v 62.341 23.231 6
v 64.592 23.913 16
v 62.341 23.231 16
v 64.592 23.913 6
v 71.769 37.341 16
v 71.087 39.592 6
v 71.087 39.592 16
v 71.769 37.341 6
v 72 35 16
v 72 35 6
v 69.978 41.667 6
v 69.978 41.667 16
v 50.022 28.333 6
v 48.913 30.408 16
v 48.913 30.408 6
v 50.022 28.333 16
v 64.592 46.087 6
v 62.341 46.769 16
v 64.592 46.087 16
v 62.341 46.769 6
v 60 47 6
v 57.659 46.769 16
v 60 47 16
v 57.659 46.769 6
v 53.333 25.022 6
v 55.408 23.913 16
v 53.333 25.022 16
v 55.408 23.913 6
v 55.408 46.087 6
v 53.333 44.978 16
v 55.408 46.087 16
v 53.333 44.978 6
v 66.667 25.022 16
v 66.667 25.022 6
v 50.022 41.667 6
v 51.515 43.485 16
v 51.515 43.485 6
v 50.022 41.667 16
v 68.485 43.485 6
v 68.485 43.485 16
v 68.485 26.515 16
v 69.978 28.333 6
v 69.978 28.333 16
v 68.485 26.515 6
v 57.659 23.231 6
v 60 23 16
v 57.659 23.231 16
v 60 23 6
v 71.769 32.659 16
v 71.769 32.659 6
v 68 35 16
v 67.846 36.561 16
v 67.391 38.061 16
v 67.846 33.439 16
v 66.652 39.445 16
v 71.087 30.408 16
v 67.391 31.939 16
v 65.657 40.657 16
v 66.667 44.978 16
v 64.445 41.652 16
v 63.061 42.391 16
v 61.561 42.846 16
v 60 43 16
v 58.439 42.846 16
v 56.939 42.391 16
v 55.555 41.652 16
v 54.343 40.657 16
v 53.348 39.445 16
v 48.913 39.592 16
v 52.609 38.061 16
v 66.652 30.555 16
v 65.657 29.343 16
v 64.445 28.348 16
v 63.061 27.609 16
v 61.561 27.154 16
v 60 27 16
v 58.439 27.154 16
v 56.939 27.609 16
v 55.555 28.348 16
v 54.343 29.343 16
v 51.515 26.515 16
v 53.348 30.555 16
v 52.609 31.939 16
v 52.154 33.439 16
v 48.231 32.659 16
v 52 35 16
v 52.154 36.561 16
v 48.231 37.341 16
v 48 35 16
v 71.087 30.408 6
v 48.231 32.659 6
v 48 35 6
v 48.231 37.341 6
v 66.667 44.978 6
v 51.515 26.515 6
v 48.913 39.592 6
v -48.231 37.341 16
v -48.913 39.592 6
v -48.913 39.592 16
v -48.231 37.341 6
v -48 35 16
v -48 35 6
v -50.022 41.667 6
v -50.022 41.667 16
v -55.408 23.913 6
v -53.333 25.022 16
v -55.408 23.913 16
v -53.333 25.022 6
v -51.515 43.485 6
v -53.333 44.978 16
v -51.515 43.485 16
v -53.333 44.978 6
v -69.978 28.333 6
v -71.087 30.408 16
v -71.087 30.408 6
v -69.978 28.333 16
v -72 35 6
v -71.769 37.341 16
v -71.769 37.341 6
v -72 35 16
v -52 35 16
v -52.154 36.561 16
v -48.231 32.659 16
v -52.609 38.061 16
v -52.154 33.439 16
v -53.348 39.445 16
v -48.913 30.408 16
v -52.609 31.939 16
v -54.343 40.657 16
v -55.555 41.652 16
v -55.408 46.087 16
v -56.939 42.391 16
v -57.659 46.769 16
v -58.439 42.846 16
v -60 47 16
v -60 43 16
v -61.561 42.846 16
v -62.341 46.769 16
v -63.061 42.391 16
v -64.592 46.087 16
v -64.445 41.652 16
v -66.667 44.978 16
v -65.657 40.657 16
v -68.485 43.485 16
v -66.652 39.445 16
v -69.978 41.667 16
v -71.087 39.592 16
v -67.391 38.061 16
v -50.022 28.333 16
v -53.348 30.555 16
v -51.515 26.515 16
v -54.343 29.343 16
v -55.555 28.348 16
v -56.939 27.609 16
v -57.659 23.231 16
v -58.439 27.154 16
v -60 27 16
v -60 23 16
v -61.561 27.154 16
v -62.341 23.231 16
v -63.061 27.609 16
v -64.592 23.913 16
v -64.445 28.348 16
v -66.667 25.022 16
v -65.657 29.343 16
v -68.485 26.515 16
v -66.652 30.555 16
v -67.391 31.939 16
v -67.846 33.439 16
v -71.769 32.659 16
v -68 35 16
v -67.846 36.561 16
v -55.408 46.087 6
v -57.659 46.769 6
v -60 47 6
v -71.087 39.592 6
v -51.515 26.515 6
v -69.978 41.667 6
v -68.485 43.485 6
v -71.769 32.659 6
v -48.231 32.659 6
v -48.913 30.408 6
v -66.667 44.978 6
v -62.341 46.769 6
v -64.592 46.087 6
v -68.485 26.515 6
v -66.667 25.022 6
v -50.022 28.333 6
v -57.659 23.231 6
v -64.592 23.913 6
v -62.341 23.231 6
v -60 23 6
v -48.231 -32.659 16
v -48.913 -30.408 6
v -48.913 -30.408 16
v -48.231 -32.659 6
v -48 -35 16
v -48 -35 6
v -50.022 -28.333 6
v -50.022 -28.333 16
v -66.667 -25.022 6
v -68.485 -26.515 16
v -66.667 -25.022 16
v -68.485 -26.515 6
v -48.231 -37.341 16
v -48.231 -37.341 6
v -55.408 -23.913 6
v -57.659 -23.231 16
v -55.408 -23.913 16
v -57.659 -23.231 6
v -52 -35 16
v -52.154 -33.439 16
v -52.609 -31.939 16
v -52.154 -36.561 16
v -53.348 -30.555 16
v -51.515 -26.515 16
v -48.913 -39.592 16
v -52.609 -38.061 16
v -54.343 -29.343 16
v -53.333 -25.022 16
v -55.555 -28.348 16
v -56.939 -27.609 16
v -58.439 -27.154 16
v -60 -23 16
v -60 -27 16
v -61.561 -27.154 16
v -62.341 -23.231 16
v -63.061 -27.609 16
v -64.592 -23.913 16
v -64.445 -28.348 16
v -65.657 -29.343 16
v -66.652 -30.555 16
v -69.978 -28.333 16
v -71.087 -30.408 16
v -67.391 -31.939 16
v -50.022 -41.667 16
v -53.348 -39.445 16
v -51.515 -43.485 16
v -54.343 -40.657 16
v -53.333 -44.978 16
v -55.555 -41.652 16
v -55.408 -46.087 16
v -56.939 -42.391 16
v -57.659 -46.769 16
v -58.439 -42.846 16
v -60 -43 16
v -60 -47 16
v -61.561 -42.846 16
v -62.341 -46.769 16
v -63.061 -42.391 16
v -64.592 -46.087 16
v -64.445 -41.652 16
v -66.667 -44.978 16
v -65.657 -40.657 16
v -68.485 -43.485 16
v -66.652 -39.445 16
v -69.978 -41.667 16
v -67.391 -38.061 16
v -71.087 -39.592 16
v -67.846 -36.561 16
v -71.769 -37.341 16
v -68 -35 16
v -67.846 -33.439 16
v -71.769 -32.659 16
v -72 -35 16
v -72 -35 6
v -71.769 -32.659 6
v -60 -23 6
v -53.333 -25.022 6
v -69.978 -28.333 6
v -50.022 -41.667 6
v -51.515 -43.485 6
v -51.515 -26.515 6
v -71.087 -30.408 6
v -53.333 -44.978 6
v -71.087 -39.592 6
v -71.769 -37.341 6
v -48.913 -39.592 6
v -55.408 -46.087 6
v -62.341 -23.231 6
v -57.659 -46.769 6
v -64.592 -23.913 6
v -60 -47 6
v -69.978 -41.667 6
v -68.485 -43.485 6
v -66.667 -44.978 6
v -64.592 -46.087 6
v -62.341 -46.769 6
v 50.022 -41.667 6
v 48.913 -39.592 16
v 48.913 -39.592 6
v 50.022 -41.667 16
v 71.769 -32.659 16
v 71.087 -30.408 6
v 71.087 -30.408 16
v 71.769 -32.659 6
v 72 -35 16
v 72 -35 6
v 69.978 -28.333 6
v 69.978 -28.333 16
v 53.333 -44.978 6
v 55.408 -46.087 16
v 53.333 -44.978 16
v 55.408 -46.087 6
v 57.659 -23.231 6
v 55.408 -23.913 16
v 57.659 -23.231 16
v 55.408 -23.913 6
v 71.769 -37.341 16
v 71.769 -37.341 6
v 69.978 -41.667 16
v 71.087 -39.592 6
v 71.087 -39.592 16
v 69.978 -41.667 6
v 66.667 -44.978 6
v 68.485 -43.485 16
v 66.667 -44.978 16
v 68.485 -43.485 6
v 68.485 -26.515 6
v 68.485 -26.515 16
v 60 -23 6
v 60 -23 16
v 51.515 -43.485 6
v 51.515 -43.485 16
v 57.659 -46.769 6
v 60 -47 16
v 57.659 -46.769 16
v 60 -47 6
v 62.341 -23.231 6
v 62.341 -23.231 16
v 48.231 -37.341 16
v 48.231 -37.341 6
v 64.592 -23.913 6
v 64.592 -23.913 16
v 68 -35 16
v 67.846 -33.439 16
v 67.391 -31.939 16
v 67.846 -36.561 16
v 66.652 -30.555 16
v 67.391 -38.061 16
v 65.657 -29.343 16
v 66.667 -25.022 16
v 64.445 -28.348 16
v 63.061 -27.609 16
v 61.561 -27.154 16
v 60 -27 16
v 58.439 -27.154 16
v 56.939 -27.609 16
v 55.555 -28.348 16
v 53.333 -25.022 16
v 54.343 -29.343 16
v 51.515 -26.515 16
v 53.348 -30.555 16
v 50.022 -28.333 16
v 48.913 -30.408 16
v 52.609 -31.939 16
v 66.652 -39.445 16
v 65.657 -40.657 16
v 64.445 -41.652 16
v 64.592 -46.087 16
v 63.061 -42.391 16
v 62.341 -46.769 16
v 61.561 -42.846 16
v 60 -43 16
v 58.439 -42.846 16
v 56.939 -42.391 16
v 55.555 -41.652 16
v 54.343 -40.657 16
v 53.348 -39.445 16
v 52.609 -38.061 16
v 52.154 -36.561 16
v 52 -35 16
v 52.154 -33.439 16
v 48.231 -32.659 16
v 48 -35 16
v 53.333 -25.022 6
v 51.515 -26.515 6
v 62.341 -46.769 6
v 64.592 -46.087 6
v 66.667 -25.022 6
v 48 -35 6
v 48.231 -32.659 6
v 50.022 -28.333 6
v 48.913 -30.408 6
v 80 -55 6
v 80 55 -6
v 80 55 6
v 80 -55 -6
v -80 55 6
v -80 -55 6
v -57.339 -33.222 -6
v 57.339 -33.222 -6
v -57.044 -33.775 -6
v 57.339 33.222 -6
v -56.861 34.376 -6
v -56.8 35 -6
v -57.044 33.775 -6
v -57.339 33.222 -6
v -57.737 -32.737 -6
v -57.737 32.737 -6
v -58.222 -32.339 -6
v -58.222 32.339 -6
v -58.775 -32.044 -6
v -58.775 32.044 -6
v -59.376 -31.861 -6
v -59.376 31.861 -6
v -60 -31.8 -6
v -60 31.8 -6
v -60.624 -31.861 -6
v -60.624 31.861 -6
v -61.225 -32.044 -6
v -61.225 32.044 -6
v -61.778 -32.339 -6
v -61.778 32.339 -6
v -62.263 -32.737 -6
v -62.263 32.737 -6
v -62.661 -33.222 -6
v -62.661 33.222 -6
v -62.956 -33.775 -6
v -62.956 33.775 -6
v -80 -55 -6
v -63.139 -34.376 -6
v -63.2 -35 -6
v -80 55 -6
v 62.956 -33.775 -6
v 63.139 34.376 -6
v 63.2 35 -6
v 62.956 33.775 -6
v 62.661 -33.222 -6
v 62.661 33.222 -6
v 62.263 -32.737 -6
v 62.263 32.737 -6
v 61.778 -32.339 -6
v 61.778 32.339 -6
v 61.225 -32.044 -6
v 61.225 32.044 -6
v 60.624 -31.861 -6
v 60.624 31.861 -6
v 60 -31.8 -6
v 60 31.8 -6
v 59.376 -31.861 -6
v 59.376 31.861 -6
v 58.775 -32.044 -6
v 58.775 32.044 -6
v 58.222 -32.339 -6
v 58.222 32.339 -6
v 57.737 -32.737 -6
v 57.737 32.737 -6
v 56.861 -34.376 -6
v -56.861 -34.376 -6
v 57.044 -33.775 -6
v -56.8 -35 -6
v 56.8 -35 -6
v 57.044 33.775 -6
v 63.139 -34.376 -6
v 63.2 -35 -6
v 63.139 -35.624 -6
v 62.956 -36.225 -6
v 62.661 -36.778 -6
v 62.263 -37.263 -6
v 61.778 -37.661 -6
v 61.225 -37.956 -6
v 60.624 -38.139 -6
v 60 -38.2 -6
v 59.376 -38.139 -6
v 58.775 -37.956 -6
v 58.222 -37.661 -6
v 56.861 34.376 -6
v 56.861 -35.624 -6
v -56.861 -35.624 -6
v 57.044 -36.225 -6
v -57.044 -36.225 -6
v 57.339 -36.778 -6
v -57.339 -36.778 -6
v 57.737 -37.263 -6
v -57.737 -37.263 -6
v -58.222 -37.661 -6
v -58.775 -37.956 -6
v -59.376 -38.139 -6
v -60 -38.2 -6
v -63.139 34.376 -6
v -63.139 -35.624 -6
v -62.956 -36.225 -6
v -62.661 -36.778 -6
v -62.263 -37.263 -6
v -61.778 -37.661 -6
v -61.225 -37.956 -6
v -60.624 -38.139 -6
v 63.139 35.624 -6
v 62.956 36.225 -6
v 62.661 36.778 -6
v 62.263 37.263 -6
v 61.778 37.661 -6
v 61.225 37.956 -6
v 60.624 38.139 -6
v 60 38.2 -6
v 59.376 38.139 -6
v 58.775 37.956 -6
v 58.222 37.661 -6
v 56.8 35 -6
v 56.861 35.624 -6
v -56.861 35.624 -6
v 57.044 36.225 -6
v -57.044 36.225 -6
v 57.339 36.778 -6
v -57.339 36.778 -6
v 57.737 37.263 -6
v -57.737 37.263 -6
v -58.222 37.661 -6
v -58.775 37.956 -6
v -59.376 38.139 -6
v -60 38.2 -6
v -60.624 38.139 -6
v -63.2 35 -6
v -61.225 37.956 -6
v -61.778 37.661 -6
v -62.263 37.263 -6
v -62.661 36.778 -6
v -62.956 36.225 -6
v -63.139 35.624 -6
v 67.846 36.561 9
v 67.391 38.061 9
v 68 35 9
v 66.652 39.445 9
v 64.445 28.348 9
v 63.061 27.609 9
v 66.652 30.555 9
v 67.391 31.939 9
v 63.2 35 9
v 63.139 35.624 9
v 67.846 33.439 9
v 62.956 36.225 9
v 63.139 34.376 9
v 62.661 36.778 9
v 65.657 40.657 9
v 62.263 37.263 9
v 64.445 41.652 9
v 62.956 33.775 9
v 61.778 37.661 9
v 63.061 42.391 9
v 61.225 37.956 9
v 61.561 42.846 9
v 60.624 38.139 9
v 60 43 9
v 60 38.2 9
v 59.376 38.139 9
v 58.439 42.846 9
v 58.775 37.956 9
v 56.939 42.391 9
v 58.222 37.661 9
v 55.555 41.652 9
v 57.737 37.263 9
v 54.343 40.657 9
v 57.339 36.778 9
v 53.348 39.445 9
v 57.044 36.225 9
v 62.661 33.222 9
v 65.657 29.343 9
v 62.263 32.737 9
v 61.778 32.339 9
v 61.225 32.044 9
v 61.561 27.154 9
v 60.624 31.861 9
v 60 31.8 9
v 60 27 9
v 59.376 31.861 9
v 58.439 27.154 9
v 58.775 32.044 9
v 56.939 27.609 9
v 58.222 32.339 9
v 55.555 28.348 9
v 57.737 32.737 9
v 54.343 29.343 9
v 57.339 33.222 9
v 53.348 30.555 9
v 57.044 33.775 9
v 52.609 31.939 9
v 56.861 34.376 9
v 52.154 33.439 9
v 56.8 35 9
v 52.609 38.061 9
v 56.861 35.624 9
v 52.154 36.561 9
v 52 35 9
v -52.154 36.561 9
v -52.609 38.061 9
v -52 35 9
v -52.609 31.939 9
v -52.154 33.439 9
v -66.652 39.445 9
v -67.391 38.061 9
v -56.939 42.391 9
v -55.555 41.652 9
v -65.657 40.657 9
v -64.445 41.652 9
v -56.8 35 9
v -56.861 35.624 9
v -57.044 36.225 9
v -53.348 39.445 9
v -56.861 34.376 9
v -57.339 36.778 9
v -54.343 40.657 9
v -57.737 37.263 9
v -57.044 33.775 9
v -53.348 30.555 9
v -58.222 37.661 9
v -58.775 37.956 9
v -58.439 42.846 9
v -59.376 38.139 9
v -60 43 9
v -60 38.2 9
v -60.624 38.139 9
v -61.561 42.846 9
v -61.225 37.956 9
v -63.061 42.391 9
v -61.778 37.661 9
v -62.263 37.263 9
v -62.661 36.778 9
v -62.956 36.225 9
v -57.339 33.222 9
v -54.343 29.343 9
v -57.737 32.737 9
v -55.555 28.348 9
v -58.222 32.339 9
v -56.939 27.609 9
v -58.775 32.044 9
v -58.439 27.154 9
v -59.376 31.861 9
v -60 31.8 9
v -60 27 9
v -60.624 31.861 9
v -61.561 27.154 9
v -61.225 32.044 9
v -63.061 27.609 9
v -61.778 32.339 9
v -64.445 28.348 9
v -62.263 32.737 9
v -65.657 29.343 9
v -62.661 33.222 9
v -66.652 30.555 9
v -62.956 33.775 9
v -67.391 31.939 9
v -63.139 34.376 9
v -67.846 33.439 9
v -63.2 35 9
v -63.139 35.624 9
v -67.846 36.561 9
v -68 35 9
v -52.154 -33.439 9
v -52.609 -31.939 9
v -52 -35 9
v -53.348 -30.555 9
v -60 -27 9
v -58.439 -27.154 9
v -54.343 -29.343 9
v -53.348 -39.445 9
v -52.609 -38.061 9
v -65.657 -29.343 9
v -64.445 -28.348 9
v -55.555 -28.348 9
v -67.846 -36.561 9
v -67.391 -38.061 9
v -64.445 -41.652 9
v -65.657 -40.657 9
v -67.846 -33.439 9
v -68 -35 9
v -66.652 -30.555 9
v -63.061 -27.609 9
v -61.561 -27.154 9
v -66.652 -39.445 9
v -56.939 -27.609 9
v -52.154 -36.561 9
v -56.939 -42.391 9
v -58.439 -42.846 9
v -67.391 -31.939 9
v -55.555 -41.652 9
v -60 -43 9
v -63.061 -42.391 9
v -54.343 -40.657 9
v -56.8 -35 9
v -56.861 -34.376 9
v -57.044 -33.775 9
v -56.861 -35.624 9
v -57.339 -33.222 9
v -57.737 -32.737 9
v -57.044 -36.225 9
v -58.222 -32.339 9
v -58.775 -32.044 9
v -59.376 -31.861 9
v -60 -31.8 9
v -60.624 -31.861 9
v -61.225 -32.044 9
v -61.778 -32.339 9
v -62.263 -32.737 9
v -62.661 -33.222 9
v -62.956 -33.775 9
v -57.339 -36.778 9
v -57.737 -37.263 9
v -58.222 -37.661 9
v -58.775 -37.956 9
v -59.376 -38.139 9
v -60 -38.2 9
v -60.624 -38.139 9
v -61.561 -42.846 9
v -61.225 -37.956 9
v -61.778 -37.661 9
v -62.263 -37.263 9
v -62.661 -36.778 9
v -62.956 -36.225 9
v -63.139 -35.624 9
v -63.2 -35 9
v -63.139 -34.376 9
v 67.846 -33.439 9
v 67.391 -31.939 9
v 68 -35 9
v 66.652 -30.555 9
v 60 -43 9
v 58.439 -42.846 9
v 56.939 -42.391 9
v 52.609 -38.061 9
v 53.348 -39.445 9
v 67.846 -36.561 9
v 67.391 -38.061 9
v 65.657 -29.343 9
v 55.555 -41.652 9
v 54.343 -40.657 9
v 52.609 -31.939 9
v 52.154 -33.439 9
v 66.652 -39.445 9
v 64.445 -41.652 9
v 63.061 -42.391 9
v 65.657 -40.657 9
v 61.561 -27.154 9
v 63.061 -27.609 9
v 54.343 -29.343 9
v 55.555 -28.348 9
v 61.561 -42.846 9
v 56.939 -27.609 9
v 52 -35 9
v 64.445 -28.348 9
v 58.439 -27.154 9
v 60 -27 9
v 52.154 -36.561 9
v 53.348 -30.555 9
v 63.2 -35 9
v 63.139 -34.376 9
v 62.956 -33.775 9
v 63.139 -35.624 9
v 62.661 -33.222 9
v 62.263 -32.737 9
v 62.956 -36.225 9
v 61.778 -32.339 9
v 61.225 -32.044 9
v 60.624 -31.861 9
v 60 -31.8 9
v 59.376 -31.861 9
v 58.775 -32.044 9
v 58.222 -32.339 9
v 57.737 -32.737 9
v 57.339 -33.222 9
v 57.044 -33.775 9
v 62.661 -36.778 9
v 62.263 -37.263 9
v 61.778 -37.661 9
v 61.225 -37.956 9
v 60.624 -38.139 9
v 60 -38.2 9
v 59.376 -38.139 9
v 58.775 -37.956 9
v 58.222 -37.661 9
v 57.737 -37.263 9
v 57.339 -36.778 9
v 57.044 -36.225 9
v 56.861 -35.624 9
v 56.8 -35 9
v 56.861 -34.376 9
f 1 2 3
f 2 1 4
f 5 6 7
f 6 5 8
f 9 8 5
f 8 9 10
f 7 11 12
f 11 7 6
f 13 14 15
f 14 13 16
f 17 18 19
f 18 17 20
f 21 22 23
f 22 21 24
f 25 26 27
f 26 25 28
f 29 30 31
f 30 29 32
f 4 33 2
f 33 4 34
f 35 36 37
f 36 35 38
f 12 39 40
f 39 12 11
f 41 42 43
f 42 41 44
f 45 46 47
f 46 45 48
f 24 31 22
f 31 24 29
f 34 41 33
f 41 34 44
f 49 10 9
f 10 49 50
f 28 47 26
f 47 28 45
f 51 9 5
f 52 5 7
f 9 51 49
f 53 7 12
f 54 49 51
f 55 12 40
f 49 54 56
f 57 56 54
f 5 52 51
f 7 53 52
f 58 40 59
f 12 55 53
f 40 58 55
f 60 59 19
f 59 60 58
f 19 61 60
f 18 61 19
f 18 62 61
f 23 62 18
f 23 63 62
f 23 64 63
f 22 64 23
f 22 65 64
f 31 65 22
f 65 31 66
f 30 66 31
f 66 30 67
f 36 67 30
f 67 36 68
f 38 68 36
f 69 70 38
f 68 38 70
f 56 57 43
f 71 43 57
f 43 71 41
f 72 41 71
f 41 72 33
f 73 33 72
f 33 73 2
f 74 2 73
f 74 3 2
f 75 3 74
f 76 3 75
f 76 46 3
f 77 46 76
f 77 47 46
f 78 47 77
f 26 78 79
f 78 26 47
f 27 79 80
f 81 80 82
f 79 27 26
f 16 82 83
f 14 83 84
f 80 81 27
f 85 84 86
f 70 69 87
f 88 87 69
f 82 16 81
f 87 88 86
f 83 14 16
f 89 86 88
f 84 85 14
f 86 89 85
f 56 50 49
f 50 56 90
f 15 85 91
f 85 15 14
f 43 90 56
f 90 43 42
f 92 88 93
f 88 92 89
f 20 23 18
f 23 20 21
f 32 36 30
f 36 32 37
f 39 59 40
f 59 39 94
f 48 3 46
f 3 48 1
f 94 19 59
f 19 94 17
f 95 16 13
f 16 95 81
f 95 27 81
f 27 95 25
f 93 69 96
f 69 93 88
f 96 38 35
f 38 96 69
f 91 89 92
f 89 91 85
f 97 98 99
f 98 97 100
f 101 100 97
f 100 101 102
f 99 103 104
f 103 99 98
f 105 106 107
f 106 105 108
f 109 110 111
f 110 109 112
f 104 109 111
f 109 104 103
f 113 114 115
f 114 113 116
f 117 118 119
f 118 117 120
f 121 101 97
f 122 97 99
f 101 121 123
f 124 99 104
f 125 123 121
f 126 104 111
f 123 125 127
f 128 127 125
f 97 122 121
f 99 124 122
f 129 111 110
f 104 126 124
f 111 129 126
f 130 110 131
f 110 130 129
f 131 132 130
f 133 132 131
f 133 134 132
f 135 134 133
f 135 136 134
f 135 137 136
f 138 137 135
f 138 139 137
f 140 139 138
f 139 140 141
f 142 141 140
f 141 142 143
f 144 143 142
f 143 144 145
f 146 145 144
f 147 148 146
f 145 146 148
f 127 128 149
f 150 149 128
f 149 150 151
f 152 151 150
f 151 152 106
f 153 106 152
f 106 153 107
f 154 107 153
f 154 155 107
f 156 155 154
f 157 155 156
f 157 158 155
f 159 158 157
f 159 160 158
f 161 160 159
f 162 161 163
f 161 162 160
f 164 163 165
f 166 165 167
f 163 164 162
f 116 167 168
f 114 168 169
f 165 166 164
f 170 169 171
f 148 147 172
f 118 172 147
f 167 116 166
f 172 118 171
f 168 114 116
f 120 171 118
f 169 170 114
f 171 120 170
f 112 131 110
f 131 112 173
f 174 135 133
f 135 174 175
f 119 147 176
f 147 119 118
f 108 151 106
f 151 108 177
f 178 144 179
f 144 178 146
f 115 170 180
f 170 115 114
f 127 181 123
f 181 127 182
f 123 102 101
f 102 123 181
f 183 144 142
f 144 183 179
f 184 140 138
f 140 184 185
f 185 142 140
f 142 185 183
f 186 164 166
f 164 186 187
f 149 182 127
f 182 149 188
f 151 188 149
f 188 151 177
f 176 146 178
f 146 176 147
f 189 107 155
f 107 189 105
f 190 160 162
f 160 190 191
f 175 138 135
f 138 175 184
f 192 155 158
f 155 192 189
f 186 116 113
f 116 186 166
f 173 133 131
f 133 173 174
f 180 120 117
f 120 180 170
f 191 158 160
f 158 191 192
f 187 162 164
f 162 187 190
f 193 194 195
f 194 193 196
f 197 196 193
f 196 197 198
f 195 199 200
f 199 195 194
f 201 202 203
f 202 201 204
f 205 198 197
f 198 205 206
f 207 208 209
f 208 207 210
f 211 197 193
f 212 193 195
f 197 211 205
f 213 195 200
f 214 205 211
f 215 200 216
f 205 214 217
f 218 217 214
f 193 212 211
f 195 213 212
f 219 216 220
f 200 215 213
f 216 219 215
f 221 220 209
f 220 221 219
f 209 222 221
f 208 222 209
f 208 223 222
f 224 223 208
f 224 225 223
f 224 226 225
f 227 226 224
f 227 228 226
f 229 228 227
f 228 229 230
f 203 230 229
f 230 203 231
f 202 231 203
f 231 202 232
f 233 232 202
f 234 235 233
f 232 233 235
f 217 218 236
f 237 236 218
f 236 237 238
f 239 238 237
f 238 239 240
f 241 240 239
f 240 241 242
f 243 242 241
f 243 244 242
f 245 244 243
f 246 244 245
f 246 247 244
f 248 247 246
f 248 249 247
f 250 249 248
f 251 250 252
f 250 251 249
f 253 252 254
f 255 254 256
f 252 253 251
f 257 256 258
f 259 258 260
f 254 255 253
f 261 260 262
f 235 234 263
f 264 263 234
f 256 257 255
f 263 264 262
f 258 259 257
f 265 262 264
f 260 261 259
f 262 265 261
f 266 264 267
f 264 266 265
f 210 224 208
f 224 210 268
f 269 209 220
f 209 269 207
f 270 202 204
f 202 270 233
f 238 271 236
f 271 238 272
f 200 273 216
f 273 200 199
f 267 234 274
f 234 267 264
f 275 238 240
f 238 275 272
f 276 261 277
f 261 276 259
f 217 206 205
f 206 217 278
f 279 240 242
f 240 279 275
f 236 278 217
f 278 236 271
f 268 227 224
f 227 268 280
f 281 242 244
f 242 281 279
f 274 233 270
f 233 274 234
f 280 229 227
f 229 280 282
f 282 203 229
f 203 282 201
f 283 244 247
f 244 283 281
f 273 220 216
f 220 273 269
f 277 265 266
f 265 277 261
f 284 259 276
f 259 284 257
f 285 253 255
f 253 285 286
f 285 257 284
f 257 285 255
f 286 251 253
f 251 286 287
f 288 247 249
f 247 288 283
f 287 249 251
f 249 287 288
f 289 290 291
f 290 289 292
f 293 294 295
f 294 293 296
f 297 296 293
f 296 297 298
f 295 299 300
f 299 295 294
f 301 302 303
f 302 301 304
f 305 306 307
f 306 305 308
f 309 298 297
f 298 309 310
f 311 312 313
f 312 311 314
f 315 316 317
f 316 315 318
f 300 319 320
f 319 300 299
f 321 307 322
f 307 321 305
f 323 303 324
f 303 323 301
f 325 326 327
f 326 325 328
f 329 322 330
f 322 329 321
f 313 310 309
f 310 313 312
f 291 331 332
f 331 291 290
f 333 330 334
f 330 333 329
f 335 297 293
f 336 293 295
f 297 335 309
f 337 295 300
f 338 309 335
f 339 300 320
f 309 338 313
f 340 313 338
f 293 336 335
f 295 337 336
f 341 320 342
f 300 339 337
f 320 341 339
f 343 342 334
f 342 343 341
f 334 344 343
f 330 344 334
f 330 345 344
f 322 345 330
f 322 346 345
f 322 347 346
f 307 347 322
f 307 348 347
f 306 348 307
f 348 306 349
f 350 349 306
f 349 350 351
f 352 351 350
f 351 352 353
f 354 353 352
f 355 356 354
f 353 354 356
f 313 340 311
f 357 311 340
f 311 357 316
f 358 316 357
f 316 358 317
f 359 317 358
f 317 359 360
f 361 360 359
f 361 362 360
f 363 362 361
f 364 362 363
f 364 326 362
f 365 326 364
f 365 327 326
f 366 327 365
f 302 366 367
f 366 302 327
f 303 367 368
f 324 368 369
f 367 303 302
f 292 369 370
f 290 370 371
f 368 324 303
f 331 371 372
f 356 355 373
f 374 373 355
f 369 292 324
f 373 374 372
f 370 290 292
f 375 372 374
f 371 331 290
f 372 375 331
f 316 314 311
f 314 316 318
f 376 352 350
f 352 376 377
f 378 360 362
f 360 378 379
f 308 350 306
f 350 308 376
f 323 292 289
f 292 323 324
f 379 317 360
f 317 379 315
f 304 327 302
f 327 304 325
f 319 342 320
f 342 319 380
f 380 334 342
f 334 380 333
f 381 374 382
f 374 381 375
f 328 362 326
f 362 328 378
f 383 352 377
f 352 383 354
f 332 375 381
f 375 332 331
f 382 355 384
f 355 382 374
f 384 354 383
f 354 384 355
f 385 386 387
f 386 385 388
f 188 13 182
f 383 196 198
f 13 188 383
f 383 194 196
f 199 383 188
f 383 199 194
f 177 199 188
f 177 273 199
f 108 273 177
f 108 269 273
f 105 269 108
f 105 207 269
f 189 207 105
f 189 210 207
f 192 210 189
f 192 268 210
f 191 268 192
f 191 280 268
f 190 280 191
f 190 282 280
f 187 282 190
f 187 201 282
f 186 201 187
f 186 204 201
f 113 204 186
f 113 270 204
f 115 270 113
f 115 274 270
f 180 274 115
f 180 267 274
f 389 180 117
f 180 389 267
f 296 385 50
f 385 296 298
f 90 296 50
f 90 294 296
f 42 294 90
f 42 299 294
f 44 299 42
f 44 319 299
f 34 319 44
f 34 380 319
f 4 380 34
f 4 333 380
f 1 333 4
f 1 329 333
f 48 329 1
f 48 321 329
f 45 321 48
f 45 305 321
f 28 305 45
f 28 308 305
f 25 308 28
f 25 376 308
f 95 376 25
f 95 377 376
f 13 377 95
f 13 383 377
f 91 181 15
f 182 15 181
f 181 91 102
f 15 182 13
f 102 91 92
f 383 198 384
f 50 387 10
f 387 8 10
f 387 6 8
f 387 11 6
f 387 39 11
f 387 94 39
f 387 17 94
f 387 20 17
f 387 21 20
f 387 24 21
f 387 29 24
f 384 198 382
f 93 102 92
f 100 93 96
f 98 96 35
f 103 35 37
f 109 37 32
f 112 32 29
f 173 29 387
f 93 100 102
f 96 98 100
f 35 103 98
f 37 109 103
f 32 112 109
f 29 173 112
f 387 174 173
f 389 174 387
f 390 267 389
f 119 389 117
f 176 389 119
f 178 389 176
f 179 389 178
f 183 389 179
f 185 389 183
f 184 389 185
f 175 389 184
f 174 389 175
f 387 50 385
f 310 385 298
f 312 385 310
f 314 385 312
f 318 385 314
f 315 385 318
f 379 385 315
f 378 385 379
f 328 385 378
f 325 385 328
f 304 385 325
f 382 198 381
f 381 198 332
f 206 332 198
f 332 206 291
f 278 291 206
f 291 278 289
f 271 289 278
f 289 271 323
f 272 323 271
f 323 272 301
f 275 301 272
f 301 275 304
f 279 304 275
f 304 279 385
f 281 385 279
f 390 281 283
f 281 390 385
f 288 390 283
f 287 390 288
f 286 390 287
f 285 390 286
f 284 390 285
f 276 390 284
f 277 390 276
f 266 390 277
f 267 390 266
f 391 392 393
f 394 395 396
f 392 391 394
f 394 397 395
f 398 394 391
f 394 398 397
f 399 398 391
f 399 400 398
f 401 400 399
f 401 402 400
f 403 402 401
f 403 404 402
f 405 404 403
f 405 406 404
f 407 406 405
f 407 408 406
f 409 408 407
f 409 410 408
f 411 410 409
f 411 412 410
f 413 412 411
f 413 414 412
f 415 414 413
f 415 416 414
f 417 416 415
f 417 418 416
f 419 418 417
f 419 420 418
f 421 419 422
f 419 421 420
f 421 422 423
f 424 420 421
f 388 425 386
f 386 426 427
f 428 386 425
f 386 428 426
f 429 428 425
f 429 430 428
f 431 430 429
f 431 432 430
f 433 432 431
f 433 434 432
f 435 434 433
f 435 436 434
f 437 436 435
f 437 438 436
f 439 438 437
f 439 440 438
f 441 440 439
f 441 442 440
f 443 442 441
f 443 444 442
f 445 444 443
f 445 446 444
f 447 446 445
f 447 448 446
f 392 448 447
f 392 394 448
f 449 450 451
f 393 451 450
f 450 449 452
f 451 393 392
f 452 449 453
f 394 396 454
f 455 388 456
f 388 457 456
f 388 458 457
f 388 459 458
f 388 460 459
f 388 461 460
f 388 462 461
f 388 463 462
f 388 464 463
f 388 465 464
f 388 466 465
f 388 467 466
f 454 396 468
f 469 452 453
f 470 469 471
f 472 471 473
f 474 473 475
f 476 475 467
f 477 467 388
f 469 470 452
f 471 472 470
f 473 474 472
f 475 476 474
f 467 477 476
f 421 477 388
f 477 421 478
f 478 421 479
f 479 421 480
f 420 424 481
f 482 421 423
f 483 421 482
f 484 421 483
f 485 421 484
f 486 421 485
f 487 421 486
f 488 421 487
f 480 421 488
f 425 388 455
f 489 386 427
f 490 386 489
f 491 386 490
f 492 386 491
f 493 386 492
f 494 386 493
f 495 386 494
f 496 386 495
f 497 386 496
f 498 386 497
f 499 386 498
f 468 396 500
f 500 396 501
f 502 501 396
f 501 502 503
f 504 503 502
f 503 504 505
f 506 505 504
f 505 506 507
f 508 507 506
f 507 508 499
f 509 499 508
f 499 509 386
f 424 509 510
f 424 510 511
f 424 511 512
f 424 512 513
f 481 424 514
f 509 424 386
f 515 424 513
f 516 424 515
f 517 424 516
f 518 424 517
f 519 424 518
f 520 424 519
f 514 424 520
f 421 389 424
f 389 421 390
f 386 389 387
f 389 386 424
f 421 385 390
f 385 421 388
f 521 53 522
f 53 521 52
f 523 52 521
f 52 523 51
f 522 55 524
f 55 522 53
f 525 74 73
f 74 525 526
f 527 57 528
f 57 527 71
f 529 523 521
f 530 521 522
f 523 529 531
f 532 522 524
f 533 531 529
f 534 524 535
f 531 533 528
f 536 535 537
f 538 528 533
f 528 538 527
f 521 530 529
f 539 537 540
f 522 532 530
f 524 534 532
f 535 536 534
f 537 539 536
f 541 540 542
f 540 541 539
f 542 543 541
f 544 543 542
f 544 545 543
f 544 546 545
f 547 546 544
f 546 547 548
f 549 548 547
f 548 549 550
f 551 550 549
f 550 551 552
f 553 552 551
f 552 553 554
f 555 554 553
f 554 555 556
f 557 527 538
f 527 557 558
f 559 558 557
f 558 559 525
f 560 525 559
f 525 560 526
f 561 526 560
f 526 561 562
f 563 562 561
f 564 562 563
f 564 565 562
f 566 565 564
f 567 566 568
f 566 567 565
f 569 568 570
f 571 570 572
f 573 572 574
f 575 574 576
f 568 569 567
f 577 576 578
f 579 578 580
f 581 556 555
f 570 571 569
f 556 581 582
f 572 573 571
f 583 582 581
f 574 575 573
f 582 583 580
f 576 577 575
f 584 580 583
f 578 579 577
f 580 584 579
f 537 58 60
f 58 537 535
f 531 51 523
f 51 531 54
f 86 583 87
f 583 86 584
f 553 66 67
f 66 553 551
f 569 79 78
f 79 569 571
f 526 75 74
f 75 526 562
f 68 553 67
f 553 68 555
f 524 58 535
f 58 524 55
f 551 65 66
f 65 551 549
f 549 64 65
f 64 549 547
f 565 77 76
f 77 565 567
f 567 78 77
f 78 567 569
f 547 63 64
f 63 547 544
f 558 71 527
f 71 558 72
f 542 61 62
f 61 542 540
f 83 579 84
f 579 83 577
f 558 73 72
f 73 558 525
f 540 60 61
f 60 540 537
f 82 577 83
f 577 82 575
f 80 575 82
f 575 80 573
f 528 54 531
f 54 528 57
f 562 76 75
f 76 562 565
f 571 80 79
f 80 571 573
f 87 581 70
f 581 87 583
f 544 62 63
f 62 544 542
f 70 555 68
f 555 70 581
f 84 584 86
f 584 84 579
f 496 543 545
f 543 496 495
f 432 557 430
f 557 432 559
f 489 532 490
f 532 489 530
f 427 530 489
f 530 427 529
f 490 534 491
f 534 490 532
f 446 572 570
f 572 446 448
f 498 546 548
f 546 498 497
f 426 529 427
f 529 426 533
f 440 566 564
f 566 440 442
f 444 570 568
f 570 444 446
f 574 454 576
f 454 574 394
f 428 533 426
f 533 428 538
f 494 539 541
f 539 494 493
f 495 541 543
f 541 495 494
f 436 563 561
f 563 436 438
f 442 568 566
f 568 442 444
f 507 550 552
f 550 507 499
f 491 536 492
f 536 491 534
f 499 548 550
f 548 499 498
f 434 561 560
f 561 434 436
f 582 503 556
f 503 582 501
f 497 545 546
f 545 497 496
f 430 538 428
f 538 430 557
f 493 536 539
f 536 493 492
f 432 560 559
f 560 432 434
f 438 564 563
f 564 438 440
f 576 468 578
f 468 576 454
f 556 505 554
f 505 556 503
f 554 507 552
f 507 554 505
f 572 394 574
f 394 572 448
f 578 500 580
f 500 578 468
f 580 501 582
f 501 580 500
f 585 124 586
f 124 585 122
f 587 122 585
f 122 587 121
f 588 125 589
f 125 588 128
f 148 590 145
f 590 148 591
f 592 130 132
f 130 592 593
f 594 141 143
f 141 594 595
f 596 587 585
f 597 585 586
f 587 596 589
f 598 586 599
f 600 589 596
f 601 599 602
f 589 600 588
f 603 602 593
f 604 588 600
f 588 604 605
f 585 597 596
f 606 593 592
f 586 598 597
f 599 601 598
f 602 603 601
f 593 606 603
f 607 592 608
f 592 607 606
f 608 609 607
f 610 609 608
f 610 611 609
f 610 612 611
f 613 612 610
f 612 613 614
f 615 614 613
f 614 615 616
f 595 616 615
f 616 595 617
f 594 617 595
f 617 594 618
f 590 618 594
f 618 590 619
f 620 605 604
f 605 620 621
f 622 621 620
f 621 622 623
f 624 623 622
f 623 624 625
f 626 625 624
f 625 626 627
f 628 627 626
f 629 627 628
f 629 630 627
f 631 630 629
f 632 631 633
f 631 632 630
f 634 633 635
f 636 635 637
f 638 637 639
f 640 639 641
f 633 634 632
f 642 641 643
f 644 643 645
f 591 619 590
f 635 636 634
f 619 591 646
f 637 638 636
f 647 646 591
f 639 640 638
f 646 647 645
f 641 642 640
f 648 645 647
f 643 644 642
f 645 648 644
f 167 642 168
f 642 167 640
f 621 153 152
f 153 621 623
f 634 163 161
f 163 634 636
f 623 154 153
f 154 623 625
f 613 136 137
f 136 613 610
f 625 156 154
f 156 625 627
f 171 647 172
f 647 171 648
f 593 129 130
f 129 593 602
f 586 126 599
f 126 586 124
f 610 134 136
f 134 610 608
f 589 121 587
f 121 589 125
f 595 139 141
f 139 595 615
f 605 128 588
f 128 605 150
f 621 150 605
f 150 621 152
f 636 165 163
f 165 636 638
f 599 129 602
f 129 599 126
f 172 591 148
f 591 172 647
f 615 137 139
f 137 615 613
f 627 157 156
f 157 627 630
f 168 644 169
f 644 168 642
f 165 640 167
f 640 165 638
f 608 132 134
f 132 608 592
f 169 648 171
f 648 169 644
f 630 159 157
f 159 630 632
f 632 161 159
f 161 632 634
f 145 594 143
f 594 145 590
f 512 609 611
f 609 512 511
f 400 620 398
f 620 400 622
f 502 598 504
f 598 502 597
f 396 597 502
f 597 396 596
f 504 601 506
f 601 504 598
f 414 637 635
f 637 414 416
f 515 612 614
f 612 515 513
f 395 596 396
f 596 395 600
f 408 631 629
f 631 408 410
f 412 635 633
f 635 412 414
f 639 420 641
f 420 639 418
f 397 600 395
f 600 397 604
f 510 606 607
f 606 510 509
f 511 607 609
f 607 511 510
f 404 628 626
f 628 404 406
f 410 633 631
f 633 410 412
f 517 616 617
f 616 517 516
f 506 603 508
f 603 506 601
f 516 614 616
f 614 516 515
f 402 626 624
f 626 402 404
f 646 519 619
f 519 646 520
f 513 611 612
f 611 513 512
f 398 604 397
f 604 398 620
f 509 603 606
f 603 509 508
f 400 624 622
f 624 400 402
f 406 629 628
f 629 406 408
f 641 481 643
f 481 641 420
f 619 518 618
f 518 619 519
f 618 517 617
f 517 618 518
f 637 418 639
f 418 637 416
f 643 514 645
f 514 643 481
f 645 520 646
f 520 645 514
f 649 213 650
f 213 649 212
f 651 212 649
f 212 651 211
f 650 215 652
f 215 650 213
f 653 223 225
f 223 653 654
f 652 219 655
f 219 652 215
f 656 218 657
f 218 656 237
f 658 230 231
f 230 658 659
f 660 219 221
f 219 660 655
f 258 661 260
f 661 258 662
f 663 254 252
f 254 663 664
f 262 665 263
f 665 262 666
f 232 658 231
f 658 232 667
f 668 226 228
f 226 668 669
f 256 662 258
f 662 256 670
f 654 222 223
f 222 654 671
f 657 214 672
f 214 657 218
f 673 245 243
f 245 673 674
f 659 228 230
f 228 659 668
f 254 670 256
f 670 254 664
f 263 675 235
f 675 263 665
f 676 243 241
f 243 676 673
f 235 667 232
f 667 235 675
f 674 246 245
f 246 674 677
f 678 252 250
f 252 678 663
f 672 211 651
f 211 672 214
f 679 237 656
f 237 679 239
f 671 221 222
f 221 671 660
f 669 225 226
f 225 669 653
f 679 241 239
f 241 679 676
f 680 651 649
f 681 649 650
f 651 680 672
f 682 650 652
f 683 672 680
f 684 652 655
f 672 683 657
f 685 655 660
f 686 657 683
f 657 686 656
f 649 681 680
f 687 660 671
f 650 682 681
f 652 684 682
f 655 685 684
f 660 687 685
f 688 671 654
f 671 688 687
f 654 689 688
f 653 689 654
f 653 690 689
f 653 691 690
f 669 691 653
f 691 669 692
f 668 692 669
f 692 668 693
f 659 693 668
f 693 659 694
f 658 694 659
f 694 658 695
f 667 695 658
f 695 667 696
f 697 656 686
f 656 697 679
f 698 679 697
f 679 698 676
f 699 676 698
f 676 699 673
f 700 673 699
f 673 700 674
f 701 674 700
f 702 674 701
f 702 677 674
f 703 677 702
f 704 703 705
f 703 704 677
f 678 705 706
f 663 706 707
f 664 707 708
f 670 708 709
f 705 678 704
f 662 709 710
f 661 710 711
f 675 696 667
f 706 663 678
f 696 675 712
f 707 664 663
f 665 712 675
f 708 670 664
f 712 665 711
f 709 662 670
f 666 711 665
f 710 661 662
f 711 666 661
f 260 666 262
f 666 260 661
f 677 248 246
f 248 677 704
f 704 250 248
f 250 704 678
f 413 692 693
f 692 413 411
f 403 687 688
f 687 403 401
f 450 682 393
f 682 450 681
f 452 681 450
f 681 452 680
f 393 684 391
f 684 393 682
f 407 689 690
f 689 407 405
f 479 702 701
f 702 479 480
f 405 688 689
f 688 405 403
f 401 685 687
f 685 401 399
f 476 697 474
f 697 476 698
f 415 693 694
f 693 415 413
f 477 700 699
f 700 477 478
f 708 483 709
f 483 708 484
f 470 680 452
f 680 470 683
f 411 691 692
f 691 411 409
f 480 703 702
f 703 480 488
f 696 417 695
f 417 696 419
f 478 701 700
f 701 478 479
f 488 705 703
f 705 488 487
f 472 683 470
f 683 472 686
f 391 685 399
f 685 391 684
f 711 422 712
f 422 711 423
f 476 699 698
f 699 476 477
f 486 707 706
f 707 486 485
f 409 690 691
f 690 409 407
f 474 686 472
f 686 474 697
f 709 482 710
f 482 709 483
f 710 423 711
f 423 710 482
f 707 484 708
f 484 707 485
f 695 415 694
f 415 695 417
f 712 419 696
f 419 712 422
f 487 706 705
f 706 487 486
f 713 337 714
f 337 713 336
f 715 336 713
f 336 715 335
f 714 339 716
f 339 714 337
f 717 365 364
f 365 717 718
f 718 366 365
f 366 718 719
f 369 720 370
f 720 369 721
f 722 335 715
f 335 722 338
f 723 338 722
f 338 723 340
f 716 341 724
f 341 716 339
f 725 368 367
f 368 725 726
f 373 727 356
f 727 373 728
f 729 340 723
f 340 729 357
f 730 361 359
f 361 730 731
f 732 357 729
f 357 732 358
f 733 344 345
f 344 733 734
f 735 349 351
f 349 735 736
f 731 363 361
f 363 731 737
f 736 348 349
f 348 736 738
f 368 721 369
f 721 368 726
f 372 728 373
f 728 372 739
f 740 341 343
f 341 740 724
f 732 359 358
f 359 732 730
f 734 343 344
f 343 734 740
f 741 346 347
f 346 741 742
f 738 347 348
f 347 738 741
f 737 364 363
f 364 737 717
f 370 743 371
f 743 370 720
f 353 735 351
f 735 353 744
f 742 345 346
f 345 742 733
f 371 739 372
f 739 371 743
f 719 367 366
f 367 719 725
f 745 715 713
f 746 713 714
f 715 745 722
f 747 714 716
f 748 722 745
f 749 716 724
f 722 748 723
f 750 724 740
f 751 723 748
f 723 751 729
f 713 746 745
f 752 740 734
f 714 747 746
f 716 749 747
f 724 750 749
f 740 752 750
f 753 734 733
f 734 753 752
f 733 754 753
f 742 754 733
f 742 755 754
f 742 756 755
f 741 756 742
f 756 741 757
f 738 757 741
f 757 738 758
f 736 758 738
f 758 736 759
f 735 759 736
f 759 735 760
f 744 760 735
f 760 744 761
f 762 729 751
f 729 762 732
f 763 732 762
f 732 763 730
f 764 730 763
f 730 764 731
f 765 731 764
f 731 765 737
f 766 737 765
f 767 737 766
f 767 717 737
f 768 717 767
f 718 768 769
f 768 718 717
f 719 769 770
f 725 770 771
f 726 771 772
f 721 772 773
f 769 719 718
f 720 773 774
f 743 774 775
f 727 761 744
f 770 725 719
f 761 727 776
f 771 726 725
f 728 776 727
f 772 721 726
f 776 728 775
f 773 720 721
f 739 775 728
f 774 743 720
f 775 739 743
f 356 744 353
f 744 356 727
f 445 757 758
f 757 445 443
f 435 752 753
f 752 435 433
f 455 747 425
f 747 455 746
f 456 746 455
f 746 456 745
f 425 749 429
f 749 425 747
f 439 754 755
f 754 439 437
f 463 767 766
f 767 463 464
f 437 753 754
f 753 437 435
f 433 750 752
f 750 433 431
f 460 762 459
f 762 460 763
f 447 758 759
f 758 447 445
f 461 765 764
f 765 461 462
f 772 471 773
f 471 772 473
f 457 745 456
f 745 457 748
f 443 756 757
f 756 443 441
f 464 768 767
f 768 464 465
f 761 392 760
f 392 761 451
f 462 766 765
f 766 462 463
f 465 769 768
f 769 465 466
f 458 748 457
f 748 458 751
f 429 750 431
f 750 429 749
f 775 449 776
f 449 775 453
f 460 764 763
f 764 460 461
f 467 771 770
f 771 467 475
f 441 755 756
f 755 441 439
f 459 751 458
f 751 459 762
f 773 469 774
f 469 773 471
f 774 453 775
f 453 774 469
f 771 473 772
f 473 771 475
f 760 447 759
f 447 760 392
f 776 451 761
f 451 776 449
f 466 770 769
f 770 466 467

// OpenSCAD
$fn = 32;

// ----------------------------------------------------------------------
// Socket pad plate
// bosses with counterbored sockets for the screws
// ----------------------------------------------------------------------

// --- parameters (mm) ---
base_t = 12;             // base plate thickness
boss_h = 10;             // boss height above the base plate
boss_d = 24;             // boss diameter
socket_d = 16;           // socket diameter
socket_depth = 7;        // socket depth from the boss face
bolt_d = 6.4;            // screw clearance hole through the socket floor
plate = [160, 110, 12];  // overall size (x, y, z)
edge = 20;               // boss centre offset from the plate edge
pads = 4;                // boss count, one per corner

// --- derived feature positions (mm) ---
height = base_t + boss_h;        // = 22   overall height of the part
corner_x = plate[0] / 2 - edge;  // = 60   boss centre X
corner_y = plate[1] / 2 - edge;  // = 35   boss centre Y
feature_centers = [
  [corner_x, corner_y],
  [-corner_x, corner_y],
  [-corner_x, -corner_y],
  [corner_x, -corner_y]
];   // boss centres: sockets, holes and the pads themselves are placed from here

// base plate, bosses on feature_centers, socket + through hole in each
difference() {
  union() {
    cube(plate, center = true);
    for (centre = feature_centers)
      translate([centre[0], centre[1], plate[2] / 2 - 1])
        cylinder(d = boss_d, h = boss_h + 1);
  }
  for (centre = feature_centers) {
    translate([centre[0], centre[1], plate[2] / 2 + boss_h - socket_depth])
      cylinder(d = socket_d, h = socket_depth + 1);
    translate([centre[0], centre[1], -height])
      cylinder(d = bolt_d, h = 2 * height + 2);  // through the socket floor
  }
}
